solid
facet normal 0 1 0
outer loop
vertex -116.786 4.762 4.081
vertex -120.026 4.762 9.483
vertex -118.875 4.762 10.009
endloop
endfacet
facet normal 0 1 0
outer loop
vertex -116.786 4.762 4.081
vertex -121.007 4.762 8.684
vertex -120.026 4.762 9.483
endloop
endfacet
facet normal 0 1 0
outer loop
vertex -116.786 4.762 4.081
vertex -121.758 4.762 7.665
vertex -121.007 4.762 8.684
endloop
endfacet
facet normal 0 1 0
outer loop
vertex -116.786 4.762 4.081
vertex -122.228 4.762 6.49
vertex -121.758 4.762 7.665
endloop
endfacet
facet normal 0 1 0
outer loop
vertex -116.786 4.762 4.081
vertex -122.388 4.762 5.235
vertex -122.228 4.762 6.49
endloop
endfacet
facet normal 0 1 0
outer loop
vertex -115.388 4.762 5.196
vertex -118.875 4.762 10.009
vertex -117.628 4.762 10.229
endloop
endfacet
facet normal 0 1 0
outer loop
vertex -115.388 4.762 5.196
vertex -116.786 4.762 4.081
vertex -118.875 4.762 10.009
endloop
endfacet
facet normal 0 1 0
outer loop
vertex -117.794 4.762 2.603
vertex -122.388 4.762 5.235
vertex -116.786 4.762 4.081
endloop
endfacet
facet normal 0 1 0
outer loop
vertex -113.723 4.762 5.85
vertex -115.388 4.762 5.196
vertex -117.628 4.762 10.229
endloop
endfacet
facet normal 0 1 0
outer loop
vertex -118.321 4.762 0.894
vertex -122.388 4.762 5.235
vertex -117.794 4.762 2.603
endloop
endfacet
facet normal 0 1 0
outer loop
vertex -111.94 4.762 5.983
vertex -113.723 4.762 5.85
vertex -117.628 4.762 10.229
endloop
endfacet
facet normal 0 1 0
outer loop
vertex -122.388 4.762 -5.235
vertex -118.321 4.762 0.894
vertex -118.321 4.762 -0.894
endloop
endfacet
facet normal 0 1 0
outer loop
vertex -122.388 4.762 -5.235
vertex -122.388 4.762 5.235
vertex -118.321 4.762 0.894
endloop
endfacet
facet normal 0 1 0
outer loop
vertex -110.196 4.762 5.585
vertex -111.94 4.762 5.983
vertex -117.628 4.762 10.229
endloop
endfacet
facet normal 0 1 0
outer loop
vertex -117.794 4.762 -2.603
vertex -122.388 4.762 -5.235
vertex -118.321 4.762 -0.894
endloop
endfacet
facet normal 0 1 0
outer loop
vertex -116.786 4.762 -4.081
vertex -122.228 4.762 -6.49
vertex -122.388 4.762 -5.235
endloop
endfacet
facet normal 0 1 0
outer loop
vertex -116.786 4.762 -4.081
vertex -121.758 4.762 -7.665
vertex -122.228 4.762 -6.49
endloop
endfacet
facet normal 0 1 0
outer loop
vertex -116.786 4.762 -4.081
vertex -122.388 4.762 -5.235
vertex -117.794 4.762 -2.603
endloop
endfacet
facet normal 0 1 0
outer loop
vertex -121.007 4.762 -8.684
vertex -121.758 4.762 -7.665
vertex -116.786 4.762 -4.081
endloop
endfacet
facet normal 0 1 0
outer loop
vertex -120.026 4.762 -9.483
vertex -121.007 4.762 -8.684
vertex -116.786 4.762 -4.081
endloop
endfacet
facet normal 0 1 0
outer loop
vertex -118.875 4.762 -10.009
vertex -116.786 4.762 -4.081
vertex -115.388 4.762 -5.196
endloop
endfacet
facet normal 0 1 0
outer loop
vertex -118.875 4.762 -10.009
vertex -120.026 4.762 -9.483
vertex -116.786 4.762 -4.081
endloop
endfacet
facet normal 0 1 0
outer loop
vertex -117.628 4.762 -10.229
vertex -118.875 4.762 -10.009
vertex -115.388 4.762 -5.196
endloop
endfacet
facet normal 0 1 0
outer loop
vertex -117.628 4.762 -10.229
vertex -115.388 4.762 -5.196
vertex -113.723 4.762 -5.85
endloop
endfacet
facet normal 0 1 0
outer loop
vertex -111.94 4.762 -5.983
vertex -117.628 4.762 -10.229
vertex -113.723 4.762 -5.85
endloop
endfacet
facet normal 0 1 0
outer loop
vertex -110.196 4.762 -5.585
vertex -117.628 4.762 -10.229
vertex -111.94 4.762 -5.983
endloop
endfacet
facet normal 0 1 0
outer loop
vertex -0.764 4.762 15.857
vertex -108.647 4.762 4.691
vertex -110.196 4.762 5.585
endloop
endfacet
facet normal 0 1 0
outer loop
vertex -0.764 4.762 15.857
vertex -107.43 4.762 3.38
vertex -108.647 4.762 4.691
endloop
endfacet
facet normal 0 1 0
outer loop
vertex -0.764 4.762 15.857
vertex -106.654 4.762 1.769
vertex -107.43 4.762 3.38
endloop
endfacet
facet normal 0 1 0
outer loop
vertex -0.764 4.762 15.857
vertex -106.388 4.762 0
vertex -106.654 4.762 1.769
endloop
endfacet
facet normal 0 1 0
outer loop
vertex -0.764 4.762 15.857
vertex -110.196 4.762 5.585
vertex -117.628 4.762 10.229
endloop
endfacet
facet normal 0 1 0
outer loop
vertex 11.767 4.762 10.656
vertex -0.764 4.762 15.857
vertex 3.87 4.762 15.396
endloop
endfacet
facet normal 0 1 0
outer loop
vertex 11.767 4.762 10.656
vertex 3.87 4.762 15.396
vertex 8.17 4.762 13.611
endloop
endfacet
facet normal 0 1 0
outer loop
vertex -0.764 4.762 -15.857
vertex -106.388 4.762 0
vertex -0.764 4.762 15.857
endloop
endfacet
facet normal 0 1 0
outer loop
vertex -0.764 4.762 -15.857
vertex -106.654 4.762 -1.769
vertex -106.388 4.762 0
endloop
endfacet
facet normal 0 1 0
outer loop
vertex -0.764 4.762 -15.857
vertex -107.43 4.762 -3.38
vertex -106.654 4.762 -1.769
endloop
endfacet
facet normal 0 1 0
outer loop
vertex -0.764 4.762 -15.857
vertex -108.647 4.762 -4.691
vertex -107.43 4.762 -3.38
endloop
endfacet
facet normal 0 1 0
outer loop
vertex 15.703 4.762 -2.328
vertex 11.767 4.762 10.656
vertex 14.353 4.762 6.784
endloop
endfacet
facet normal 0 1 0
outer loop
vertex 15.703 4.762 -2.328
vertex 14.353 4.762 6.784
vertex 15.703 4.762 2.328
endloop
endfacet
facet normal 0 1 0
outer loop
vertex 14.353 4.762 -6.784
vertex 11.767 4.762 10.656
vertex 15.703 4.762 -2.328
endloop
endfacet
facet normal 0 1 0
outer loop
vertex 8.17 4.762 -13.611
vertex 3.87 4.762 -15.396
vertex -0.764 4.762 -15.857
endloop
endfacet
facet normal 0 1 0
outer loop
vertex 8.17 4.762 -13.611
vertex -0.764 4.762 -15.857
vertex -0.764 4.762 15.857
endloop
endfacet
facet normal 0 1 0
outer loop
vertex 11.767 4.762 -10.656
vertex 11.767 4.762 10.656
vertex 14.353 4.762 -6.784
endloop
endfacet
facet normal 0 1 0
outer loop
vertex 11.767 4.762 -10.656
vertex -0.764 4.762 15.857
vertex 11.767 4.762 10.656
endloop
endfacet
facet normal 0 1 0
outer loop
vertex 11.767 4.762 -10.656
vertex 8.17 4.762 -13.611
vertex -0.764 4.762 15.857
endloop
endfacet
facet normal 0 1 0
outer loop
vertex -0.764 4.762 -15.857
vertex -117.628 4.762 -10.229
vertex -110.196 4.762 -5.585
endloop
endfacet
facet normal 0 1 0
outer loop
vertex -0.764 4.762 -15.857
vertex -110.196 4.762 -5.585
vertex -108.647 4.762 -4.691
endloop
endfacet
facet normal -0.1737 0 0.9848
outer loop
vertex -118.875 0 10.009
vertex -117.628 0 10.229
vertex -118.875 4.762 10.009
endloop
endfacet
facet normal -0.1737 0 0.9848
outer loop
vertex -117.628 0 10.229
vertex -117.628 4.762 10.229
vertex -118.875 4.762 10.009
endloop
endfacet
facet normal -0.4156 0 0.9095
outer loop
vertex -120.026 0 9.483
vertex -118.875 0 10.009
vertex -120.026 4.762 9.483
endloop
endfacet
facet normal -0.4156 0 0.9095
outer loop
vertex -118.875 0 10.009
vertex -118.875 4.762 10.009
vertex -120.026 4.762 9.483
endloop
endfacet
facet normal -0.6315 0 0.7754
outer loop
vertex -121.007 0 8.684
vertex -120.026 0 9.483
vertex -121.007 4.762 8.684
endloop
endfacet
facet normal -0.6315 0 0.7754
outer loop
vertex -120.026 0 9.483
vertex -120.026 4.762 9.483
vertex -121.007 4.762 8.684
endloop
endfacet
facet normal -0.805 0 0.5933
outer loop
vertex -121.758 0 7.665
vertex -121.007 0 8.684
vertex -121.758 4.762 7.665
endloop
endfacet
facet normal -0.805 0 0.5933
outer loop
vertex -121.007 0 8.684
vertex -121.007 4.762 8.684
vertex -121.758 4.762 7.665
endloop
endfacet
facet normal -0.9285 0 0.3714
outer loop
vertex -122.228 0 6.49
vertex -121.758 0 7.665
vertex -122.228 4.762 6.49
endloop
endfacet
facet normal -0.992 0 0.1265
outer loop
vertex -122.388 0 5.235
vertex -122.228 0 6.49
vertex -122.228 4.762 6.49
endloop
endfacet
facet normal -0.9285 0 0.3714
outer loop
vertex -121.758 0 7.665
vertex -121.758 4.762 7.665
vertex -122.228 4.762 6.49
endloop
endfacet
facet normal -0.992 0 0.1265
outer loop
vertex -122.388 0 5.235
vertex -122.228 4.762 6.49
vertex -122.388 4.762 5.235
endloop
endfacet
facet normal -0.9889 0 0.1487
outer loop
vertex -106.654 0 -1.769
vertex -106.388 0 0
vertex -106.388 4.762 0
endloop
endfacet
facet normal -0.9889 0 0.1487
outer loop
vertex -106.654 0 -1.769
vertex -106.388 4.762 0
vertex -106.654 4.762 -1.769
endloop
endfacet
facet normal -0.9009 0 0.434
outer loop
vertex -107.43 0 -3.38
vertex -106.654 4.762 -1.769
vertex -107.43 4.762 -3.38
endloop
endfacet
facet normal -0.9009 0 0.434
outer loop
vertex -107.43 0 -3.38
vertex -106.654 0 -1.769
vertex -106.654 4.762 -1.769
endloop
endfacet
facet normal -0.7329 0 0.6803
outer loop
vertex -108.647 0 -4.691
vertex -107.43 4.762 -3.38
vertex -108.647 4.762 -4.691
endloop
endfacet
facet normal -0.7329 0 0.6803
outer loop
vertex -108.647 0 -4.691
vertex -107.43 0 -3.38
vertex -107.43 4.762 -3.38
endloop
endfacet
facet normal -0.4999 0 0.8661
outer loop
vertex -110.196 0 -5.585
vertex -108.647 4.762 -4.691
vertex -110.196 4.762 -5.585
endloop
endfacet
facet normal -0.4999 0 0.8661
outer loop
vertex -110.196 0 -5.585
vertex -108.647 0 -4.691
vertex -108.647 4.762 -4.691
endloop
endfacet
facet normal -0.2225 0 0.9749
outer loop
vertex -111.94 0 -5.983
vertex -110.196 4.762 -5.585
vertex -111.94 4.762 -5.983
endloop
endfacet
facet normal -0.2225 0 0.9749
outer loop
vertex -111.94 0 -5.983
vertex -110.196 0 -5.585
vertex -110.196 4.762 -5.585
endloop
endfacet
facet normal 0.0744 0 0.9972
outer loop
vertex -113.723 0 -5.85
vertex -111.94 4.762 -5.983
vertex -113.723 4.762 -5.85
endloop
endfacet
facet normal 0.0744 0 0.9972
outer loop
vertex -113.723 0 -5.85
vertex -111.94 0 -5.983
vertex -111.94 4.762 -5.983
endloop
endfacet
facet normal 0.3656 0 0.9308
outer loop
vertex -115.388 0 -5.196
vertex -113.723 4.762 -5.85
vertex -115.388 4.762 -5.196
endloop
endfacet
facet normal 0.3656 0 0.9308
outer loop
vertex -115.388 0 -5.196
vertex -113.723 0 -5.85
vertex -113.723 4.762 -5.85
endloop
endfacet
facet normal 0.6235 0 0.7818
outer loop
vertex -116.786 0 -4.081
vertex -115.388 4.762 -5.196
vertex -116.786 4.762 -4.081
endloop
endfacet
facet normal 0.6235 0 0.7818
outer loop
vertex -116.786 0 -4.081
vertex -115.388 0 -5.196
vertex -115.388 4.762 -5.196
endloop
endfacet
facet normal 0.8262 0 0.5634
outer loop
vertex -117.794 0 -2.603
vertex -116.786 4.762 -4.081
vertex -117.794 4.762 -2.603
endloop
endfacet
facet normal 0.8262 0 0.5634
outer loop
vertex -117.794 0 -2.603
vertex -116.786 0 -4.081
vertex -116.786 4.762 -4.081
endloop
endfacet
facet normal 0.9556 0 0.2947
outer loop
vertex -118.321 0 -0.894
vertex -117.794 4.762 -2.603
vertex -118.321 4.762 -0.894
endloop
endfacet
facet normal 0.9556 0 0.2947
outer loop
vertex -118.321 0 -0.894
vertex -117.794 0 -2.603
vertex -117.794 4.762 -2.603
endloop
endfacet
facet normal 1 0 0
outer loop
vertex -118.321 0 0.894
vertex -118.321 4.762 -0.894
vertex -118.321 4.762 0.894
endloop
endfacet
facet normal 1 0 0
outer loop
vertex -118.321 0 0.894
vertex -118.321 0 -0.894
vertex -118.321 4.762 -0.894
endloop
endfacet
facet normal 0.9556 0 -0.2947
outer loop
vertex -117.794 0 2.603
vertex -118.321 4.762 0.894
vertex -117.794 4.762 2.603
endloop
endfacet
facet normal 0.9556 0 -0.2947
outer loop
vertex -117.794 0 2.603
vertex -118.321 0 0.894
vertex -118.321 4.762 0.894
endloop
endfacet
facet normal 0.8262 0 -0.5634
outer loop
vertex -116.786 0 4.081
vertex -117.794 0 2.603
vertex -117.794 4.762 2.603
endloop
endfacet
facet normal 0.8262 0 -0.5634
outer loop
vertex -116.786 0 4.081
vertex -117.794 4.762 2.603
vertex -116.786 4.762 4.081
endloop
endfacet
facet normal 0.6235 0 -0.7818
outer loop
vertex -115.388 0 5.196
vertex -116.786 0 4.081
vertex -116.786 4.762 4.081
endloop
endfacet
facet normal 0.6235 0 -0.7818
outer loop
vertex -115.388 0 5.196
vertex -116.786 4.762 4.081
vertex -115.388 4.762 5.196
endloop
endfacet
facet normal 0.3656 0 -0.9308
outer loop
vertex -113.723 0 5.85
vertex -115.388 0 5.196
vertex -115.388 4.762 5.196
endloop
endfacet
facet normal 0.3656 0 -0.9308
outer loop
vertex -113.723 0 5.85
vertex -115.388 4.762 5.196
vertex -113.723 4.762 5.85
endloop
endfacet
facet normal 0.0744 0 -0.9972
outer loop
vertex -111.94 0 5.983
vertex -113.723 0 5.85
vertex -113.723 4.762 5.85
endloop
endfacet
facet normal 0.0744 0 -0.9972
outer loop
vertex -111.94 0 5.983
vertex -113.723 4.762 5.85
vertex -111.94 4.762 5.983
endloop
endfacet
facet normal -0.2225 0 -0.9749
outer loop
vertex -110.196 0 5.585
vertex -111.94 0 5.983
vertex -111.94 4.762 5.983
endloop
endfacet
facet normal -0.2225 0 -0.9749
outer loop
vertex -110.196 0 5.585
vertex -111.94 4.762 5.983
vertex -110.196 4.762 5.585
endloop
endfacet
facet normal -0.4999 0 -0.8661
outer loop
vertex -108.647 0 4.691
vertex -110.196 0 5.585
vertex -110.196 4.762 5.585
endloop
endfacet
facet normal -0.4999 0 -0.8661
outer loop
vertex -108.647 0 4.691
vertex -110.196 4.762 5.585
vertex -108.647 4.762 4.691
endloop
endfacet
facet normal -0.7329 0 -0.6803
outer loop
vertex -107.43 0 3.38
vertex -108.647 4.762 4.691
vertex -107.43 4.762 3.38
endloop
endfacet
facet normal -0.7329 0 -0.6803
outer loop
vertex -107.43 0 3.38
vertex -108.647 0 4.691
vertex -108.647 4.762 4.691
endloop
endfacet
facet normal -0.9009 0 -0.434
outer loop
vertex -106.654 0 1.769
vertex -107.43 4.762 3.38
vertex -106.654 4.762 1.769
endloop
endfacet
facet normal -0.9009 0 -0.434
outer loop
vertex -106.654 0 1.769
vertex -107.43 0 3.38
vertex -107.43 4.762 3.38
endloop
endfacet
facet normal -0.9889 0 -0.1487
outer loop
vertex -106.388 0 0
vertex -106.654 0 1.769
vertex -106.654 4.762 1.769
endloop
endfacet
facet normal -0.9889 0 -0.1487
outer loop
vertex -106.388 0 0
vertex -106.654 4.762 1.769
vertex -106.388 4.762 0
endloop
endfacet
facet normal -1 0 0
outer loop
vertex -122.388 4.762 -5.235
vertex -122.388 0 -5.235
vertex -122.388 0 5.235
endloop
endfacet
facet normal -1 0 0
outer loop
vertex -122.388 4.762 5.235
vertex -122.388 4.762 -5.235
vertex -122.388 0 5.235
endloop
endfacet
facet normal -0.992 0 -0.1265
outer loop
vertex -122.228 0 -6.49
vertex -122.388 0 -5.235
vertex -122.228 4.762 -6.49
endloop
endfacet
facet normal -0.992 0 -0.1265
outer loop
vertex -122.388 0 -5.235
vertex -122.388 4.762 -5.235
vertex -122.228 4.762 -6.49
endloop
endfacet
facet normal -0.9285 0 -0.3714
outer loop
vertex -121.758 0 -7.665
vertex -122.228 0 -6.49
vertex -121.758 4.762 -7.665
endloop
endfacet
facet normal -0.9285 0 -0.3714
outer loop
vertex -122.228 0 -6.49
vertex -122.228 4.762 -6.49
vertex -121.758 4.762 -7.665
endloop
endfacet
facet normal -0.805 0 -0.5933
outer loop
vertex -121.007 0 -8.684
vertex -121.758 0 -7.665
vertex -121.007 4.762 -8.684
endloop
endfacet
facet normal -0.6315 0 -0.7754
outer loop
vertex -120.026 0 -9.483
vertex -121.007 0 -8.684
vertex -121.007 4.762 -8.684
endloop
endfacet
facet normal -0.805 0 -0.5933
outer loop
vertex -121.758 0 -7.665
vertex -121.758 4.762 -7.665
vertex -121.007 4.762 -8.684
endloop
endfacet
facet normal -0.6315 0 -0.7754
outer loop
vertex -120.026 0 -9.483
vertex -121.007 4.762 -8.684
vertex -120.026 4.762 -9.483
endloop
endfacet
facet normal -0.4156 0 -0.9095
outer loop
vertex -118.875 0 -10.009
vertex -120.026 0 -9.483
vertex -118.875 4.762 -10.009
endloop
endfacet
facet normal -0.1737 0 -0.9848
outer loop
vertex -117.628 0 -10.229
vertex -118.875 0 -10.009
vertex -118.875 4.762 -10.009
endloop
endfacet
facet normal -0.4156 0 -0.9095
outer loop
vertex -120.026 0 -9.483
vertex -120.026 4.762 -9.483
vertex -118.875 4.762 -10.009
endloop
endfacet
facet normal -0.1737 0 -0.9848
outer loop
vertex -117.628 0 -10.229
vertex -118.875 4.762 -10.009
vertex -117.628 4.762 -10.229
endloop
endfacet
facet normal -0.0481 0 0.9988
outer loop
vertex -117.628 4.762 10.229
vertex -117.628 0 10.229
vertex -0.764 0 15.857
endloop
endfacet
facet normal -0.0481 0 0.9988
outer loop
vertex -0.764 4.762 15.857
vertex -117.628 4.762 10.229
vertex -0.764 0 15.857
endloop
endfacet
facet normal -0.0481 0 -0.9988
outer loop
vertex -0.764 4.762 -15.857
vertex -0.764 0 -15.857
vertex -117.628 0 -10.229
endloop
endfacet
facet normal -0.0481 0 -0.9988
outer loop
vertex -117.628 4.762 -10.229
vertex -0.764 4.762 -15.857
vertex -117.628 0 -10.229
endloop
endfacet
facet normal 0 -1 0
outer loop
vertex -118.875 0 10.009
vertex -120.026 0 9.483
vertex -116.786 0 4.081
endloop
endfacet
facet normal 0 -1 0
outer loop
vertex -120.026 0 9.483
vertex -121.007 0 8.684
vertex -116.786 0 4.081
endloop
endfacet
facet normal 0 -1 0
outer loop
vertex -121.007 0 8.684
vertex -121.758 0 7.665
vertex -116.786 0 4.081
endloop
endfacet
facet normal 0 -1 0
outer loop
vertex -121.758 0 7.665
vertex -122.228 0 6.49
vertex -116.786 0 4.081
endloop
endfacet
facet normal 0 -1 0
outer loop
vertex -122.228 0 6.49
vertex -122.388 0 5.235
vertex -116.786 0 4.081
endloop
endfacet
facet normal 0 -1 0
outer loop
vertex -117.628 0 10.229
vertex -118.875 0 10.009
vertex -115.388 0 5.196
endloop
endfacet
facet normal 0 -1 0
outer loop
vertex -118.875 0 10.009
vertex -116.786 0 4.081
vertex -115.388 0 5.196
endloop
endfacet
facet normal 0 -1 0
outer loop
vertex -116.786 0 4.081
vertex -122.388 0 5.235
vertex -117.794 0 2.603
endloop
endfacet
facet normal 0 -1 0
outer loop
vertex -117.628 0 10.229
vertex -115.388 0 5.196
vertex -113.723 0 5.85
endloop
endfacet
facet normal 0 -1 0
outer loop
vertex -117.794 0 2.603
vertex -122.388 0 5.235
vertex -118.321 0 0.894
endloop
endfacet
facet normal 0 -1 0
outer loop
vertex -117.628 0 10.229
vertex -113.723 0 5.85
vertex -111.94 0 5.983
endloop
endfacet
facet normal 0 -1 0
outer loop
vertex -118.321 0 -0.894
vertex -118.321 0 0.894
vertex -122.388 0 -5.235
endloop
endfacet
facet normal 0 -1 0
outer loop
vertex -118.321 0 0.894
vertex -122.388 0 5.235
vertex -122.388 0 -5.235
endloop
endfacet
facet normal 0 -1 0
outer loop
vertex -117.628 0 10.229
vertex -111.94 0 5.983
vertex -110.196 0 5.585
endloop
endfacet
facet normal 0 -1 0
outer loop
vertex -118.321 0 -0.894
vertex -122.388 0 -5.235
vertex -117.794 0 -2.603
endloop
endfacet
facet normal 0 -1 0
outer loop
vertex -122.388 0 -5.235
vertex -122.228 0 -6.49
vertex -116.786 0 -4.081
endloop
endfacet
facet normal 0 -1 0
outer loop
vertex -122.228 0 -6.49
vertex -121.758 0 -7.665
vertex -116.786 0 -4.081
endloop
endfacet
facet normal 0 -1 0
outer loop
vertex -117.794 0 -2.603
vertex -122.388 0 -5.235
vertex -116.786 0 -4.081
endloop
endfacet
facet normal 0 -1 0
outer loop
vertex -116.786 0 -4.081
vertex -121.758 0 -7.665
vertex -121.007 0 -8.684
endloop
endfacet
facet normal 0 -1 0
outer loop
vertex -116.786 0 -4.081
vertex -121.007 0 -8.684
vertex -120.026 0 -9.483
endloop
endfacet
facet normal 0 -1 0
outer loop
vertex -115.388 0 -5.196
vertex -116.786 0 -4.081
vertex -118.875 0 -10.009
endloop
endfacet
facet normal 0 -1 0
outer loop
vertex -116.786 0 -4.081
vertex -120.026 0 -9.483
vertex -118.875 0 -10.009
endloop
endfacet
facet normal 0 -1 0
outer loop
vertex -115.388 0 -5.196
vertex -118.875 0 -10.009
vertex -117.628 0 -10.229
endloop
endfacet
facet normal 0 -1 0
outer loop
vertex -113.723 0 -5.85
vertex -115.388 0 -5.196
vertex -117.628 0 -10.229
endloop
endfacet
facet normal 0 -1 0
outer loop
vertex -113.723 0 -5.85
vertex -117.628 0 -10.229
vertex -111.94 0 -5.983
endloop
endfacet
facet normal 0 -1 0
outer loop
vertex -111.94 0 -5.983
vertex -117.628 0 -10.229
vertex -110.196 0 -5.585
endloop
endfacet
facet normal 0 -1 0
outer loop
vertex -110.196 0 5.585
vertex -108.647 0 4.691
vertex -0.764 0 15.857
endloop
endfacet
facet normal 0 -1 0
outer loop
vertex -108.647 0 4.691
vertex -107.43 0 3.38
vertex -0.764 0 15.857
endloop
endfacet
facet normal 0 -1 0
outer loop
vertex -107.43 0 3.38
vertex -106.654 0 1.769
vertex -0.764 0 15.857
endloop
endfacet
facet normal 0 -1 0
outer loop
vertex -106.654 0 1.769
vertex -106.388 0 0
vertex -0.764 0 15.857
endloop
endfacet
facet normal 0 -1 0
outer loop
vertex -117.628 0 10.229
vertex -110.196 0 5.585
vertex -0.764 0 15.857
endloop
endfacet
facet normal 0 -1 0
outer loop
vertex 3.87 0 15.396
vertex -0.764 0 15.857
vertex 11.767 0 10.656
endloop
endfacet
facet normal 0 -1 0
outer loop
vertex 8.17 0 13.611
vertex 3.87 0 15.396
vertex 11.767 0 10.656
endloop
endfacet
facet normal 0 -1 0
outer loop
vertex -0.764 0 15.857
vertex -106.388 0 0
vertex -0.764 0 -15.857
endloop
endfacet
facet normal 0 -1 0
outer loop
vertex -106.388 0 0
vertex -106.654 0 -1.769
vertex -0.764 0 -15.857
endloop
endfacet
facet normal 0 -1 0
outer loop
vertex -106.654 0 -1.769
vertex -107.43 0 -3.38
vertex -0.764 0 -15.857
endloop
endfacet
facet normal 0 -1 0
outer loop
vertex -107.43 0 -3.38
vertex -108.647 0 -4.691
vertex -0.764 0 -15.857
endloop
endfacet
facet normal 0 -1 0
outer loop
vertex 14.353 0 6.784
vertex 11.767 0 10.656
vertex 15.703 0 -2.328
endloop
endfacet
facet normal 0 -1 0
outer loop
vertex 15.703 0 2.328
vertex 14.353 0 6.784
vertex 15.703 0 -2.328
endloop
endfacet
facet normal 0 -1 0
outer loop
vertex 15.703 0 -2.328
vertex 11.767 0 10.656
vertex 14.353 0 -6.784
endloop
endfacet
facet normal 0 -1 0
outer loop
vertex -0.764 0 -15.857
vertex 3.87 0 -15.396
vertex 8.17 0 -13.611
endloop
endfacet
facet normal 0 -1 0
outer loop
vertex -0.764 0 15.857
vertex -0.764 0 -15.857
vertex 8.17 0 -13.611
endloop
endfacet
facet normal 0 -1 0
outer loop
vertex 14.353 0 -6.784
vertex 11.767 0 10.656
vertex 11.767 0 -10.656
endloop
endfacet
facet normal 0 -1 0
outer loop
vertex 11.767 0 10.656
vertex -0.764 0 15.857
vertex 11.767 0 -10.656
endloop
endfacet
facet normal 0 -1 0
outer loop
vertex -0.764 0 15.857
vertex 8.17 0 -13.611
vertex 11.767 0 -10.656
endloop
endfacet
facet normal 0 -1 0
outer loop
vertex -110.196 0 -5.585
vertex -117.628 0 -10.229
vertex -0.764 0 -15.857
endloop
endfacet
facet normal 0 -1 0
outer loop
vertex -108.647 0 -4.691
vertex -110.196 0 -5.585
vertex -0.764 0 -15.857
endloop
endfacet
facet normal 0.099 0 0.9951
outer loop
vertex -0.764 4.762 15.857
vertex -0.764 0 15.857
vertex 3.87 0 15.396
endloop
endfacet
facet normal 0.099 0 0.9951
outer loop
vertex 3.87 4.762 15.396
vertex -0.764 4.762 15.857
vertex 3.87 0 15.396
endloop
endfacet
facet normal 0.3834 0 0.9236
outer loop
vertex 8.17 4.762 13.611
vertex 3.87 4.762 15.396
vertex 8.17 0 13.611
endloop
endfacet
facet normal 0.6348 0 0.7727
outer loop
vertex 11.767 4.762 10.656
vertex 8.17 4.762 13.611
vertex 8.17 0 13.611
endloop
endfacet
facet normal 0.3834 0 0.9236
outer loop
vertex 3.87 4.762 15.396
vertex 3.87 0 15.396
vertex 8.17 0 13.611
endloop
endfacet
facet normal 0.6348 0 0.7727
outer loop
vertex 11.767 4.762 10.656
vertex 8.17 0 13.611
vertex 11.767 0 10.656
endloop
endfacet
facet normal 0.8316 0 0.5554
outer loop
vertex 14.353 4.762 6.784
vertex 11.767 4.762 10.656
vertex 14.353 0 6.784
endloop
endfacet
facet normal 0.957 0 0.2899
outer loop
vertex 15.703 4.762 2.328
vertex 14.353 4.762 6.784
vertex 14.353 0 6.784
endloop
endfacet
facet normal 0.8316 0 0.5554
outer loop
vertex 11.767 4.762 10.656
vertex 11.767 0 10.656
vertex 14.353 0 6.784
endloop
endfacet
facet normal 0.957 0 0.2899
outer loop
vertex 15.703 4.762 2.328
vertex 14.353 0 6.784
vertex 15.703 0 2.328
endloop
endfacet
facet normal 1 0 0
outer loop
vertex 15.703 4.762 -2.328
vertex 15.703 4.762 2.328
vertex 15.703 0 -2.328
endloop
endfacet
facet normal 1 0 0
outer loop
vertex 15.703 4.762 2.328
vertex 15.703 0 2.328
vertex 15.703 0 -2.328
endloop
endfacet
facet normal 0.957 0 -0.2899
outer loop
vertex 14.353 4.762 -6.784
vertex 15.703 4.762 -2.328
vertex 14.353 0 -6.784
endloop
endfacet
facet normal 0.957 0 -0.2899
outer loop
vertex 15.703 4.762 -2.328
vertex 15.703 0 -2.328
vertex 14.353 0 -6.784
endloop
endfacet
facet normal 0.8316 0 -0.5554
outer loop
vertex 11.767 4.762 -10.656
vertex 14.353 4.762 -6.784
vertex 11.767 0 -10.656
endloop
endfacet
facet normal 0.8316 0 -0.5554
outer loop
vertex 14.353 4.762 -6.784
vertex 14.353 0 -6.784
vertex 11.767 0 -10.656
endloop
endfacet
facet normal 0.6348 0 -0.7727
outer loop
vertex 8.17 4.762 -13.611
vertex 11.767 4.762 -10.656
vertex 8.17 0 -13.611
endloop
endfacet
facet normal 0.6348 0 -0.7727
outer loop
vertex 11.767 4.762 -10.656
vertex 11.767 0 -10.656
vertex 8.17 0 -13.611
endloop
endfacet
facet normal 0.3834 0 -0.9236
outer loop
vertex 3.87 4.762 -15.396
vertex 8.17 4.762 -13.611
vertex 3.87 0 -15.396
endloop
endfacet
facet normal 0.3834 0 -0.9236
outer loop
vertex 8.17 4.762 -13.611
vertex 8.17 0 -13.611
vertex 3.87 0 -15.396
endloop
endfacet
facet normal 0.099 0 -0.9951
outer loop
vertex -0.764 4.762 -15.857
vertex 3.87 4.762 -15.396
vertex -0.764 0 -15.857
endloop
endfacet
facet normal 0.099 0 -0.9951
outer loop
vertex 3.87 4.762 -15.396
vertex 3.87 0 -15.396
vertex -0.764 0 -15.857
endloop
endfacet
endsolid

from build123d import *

# Parameters (mm, degrees)
SKETCH2_R           = 6
BOSS_EXTRUDE1_DEPTH = 4.7625
FILLET1_R           = 5


with BuildPart() as part:
    # Sketch2 → Boss-Extrude1 (new body)
    with BuildSketch(Plane(origin=(0, 0, 0), x_dir=(1, 0, 0), z_dir=(0, 1, 0))):
        with BuildLine():
            Line((-122.387926706, -10), (-0.763550737, -15.856626857))
            ThreePointArc((-0.763550737, -15.856626857), (15.875, -1.57e-07), (-0.763550423, 15.856626872))
            Line((-0.763550423, 15.856626872), (-122.387926706, 10))
            Line((-122.387926706, 10), (-122.387926706, -10))
        make_face()
        with Locations((-112.387926706, 0)):
            Circle(SKETCH2_R, mode=Mode.SUBTRACT)
    extrude(amount=BOSS_EXTRUDE1_DEPTH)

    # Fillet1
    fillet1_edges = [part.edges().sort_by_distance(p)[0] for p in [
        (-122.387926706, 2.38125, 10),
        (-122.387926706, 2.38125, -10),
    ]]
    fillet(fillet1_edges, radius=FILLET1_R)


solid = part.part
